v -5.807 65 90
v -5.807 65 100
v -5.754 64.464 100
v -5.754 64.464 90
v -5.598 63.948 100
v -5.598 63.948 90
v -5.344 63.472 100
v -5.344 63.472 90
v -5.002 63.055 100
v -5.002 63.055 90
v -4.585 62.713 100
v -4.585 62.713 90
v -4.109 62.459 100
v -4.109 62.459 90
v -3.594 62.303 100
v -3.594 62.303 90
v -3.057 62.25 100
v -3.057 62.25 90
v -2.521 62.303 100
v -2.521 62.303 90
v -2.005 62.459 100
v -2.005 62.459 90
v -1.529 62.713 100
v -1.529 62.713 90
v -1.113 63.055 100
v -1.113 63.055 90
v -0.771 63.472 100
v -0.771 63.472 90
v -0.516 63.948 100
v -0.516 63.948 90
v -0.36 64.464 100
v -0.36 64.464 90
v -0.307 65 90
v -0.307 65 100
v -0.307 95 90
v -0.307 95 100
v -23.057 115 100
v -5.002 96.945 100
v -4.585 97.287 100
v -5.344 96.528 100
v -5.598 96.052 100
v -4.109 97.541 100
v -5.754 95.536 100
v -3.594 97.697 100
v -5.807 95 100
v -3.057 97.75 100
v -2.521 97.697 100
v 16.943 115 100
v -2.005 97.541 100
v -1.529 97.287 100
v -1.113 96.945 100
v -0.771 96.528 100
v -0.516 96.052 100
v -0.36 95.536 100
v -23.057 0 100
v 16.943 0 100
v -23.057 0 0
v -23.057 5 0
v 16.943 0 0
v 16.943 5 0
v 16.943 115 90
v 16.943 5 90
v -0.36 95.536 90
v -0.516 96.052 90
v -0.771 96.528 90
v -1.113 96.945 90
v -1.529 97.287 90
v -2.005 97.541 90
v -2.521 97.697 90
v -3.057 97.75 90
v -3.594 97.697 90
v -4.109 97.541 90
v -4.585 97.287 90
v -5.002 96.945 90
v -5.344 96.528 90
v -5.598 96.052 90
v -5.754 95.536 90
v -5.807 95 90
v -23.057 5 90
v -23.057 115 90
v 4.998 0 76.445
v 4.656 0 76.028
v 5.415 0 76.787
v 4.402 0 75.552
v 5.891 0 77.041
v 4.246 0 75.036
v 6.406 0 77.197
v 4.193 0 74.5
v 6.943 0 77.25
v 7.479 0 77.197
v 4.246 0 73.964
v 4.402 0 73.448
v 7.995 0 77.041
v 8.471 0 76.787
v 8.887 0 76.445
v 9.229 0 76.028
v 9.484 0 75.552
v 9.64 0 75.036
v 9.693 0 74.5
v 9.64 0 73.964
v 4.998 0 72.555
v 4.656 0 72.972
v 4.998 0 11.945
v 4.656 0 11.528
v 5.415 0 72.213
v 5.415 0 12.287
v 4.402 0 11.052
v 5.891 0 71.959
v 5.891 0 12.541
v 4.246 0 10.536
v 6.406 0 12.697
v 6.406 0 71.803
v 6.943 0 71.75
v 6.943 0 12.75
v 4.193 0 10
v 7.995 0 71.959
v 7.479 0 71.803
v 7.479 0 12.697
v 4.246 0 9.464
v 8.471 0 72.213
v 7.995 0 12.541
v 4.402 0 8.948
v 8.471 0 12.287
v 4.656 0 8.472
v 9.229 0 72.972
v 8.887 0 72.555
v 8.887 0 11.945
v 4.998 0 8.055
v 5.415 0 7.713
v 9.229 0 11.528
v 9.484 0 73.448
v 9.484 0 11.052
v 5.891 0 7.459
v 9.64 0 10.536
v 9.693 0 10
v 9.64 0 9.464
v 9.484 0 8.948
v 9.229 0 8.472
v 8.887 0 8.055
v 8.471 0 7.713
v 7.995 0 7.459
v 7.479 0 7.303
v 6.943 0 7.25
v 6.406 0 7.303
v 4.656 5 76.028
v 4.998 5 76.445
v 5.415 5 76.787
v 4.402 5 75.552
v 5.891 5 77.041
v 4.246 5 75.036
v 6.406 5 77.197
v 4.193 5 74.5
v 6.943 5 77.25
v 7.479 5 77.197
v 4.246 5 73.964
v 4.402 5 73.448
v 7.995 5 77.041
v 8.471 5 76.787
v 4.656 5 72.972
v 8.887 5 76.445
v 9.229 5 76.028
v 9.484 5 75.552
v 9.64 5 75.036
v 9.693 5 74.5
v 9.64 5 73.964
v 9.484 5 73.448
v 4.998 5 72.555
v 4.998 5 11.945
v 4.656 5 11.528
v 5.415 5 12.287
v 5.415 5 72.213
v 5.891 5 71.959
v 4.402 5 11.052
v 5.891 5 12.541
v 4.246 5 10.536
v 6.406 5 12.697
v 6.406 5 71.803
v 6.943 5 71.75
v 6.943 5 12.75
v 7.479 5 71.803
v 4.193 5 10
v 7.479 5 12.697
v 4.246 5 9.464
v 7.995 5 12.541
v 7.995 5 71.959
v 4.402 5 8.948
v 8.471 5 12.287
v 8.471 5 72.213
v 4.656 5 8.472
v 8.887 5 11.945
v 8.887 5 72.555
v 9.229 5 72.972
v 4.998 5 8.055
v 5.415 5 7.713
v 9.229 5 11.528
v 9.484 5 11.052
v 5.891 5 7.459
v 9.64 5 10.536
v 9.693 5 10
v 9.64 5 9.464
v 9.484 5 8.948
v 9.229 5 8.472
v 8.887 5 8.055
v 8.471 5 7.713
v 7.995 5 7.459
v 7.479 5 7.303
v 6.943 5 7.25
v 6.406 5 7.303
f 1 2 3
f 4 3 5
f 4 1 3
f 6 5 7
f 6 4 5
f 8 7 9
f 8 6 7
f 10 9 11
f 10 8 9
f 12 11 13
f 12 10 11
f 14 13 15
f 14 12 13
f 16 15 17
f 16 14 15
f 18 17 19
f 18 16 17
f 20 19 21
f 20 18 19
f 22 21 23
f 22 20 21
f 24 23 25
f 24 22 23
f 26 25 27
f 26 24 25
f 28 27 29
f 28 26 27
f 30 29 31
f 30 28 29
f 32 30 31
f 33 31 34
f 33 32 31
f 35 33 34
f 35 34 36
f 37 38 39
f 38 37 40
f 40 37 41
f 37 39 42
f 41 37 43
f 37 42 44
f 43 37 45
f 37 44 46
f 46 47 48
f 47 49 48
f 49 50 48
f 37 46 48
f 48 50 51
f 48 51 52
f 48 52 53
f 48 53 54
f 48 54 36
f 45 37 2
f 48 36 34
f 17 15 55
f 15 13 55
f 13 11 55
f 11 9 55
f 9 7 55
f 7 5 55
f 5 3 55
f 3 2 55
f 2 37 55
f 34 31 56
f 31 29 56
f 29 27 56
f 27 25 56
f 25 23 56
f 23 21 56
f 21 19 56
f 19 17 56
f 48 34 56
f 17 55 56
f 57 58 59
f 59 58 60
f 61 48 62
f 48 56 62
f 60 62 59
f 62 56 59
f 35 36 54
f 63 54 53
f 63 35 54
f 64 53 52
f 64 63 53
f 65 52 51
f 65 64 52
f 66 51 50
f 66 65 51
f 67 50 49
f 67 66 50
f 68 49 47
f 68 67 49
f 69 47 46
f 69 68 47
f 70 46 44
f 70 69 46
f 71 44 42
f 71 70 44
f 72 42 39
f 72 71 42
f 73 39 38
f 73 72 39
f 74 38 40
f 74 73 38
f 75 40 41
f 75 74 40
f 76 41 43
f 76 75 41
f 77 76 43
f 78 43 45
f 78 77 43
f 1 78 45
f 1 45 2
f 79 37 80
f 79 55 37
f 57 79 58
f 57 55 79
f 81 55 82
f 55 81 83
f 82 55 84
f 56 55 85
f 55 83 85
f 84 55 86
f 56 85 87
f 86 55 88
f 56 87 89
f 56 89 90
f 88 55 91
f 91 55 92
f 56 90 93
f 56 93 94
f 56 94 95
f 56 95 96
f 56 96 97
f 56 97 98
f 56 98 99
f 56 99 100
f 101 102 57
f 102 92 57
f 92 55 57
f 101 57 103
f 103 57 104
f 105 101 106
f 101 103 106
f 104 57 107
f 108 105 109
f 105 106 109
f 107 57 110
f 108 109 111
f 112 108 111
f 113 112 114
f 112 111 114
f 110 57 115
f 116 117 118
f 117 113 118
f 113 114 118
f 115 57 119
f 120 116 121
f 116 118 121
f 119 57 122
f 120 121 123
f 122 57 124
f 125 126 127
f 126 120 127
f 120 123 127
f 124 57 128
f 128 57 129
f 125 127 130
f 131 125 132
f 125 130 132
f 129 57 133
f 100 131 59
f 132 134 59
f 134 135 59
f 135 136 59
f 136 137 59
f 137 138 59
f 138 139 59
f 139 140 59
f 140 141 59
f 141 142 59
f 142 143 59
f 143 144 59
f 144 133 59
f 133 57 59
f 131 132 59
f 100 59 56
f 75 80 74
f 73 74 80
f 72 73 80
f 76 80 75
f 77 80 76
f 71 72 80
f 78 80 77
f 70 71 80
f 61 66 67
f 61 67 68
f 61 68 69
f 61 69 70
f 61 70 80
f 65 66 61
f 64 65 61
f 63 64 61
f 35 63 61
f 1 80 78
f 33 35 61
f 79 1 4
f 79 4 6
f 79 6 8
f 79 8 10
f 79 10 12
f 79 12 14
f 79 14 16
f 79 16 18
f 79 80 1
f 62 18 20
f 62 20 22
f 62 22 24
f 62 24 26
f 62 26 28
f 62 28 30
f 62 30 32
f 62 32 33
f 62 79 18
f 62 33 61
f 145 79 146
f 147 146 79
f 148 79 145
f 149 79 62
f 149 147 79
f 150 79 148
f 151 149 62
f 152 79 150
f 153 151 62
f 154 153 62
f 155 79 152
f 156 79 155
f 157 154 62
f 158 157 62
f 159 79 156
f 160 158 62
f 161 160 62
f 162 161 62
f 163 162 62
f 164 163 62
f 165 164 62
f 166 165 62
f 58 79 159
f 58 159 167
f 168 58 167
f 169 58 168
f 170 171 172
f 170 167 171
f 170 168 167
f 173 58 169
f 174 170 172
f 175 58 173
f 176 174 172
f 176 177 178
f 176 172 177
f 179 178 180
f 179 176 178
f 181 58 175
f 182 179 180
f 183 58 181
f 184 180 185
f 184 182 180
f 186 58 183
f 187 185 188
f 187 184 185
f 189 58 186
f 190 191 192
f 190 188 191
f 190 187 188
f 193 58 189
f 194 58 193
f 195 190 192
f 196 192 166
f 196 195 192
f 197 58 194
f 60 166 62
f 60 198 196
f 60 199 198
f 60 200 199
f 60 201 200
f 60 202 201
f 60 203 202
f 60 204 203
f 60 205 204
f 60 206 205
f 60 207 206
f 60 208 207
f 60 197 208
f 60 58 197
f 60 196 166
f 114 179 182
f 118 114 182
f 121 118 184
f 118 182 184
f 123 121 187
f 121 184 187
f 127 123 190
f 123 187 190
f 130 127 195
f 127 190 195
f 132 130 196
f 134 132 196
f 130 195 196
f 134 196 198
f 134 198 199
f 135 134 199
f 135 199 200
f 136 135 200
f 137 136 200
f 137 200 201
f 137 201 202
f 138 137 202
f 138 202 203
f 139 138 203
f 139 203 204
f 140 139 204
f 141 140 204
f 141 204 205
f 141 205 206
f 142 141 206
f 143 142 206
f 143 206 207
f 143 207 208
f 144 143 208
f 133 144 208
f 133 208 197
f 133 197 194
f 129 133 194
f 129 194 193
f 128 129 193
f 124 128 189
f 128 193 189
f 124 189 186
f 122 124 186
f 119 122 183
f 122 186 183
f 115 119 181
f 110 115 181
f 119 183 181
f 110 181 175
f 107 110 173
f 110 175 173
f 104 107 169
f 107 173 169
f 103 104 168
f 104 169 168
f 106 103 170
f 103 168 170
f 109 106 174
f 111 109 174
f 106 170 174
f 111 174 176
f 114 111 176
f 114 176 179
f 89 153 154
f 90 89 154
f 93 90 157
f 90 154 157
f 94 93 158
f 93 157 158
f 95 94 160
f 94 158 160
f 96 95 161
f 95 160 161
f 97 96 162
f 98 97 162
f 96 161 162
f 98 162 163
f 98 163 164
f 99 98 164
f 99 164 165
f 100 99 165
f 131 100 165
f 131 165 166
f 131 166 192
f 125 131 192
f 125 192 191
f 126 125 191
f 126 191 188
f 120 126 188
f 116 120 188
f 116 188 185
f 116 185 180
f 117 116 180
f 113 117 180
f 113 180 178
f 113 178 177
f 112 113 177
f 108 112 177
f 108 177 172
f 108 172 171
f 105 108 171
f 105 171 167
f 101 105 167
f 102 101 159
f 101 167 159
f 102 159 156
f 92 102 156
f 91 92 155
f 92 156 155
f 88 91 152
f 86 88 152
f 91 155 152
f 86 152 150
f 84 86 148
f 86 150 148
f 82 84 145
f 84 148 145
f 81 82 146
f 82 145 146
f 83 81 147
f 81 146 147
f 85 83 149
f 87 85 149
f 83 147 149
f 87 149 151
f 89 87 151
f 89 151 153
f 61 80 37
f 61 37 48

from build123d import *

# Parameters (mm, degrees)
SKETCH_1_W          = 40
SKETCH_1_H          = 5
EXTRUDE_1_DEPTH     = 100
SKETCH_3_R          = 2.75
CUT_EXTRUDE_1_DEPTH = 103.745450916
SKETCH_5_W          = 40
SKETCH_5_H          = 10
EXTRUDE_2_DEPTH     = 110
CUT_EXTRUDE_2_DEPTH = 148.839871767


with BuildPart() as part:
    # 草圖1 → 填料-伸長1 (new body)
    with BuildSketch(Plane.XY):
        with Locations((-3.057052805, 2.5)):
            Rectangle(SKETCH_1_W, SKETCH_1_H)
    extrude(amount=EXTRUDE_1_DEPTH)

    # 草圖3 → 除料-伸長1 (cut, through all)
    with BuildSketch(Plane(origin=(0, 5, 0), x_dir=(1, 0, 0), z_dir=(0, 1, 0))):
        with Locations(Location((6.942947195, -10, 0), (0, 0, 270))):
            Circle(SKETCH_3_R)
        with Locations(Location((6.942947195, -74.5, 0), (0, 0, 270))):
            Circle(SKETCH_3_R)
    extrude(amount=-CUT_EXTRUDE_1_DEPTH, mode=Mode.SUBTRACT)

    # 草圖5 → 填料-伸長2 (add)
    with BuildSketch(Plane(origin=(0, 5, 0), x_dir=(1, 0, 0), z_dir=(0, 1, 0))):
        with Locations((-3.057052805, -95)):
            Rectangle(SKETCH_5_W, SKETCH_5_H)
    extrude(amount=EXTRUDE_2_DEPTH)

    # 草圖7 → 除料-伸長2 (cut, through all)
    with BuildSketch(Plane(origin=(0, 0, 90), x_dir=(-1, 0, 0), z_dir=(0, 0, -1))):
        with BuildLine():
            Line((5.807052805, 95), (5.807052805, 65))
            ThreePointArc((5.807052805, 65), (3.057052805, 62.25), (0.307052805, 65))
            Line((0.307052805, 65), (0.307052805, 95))
            ThreePointArc((0.307052805, 95), (3.057052805, 97.75), (5.807052805, 95))
        make_face()
    extrude(amount=-CUT_EXTRUDE_2_DEPTH, mode=Mode.SUBTRACT)


solid = part.part
